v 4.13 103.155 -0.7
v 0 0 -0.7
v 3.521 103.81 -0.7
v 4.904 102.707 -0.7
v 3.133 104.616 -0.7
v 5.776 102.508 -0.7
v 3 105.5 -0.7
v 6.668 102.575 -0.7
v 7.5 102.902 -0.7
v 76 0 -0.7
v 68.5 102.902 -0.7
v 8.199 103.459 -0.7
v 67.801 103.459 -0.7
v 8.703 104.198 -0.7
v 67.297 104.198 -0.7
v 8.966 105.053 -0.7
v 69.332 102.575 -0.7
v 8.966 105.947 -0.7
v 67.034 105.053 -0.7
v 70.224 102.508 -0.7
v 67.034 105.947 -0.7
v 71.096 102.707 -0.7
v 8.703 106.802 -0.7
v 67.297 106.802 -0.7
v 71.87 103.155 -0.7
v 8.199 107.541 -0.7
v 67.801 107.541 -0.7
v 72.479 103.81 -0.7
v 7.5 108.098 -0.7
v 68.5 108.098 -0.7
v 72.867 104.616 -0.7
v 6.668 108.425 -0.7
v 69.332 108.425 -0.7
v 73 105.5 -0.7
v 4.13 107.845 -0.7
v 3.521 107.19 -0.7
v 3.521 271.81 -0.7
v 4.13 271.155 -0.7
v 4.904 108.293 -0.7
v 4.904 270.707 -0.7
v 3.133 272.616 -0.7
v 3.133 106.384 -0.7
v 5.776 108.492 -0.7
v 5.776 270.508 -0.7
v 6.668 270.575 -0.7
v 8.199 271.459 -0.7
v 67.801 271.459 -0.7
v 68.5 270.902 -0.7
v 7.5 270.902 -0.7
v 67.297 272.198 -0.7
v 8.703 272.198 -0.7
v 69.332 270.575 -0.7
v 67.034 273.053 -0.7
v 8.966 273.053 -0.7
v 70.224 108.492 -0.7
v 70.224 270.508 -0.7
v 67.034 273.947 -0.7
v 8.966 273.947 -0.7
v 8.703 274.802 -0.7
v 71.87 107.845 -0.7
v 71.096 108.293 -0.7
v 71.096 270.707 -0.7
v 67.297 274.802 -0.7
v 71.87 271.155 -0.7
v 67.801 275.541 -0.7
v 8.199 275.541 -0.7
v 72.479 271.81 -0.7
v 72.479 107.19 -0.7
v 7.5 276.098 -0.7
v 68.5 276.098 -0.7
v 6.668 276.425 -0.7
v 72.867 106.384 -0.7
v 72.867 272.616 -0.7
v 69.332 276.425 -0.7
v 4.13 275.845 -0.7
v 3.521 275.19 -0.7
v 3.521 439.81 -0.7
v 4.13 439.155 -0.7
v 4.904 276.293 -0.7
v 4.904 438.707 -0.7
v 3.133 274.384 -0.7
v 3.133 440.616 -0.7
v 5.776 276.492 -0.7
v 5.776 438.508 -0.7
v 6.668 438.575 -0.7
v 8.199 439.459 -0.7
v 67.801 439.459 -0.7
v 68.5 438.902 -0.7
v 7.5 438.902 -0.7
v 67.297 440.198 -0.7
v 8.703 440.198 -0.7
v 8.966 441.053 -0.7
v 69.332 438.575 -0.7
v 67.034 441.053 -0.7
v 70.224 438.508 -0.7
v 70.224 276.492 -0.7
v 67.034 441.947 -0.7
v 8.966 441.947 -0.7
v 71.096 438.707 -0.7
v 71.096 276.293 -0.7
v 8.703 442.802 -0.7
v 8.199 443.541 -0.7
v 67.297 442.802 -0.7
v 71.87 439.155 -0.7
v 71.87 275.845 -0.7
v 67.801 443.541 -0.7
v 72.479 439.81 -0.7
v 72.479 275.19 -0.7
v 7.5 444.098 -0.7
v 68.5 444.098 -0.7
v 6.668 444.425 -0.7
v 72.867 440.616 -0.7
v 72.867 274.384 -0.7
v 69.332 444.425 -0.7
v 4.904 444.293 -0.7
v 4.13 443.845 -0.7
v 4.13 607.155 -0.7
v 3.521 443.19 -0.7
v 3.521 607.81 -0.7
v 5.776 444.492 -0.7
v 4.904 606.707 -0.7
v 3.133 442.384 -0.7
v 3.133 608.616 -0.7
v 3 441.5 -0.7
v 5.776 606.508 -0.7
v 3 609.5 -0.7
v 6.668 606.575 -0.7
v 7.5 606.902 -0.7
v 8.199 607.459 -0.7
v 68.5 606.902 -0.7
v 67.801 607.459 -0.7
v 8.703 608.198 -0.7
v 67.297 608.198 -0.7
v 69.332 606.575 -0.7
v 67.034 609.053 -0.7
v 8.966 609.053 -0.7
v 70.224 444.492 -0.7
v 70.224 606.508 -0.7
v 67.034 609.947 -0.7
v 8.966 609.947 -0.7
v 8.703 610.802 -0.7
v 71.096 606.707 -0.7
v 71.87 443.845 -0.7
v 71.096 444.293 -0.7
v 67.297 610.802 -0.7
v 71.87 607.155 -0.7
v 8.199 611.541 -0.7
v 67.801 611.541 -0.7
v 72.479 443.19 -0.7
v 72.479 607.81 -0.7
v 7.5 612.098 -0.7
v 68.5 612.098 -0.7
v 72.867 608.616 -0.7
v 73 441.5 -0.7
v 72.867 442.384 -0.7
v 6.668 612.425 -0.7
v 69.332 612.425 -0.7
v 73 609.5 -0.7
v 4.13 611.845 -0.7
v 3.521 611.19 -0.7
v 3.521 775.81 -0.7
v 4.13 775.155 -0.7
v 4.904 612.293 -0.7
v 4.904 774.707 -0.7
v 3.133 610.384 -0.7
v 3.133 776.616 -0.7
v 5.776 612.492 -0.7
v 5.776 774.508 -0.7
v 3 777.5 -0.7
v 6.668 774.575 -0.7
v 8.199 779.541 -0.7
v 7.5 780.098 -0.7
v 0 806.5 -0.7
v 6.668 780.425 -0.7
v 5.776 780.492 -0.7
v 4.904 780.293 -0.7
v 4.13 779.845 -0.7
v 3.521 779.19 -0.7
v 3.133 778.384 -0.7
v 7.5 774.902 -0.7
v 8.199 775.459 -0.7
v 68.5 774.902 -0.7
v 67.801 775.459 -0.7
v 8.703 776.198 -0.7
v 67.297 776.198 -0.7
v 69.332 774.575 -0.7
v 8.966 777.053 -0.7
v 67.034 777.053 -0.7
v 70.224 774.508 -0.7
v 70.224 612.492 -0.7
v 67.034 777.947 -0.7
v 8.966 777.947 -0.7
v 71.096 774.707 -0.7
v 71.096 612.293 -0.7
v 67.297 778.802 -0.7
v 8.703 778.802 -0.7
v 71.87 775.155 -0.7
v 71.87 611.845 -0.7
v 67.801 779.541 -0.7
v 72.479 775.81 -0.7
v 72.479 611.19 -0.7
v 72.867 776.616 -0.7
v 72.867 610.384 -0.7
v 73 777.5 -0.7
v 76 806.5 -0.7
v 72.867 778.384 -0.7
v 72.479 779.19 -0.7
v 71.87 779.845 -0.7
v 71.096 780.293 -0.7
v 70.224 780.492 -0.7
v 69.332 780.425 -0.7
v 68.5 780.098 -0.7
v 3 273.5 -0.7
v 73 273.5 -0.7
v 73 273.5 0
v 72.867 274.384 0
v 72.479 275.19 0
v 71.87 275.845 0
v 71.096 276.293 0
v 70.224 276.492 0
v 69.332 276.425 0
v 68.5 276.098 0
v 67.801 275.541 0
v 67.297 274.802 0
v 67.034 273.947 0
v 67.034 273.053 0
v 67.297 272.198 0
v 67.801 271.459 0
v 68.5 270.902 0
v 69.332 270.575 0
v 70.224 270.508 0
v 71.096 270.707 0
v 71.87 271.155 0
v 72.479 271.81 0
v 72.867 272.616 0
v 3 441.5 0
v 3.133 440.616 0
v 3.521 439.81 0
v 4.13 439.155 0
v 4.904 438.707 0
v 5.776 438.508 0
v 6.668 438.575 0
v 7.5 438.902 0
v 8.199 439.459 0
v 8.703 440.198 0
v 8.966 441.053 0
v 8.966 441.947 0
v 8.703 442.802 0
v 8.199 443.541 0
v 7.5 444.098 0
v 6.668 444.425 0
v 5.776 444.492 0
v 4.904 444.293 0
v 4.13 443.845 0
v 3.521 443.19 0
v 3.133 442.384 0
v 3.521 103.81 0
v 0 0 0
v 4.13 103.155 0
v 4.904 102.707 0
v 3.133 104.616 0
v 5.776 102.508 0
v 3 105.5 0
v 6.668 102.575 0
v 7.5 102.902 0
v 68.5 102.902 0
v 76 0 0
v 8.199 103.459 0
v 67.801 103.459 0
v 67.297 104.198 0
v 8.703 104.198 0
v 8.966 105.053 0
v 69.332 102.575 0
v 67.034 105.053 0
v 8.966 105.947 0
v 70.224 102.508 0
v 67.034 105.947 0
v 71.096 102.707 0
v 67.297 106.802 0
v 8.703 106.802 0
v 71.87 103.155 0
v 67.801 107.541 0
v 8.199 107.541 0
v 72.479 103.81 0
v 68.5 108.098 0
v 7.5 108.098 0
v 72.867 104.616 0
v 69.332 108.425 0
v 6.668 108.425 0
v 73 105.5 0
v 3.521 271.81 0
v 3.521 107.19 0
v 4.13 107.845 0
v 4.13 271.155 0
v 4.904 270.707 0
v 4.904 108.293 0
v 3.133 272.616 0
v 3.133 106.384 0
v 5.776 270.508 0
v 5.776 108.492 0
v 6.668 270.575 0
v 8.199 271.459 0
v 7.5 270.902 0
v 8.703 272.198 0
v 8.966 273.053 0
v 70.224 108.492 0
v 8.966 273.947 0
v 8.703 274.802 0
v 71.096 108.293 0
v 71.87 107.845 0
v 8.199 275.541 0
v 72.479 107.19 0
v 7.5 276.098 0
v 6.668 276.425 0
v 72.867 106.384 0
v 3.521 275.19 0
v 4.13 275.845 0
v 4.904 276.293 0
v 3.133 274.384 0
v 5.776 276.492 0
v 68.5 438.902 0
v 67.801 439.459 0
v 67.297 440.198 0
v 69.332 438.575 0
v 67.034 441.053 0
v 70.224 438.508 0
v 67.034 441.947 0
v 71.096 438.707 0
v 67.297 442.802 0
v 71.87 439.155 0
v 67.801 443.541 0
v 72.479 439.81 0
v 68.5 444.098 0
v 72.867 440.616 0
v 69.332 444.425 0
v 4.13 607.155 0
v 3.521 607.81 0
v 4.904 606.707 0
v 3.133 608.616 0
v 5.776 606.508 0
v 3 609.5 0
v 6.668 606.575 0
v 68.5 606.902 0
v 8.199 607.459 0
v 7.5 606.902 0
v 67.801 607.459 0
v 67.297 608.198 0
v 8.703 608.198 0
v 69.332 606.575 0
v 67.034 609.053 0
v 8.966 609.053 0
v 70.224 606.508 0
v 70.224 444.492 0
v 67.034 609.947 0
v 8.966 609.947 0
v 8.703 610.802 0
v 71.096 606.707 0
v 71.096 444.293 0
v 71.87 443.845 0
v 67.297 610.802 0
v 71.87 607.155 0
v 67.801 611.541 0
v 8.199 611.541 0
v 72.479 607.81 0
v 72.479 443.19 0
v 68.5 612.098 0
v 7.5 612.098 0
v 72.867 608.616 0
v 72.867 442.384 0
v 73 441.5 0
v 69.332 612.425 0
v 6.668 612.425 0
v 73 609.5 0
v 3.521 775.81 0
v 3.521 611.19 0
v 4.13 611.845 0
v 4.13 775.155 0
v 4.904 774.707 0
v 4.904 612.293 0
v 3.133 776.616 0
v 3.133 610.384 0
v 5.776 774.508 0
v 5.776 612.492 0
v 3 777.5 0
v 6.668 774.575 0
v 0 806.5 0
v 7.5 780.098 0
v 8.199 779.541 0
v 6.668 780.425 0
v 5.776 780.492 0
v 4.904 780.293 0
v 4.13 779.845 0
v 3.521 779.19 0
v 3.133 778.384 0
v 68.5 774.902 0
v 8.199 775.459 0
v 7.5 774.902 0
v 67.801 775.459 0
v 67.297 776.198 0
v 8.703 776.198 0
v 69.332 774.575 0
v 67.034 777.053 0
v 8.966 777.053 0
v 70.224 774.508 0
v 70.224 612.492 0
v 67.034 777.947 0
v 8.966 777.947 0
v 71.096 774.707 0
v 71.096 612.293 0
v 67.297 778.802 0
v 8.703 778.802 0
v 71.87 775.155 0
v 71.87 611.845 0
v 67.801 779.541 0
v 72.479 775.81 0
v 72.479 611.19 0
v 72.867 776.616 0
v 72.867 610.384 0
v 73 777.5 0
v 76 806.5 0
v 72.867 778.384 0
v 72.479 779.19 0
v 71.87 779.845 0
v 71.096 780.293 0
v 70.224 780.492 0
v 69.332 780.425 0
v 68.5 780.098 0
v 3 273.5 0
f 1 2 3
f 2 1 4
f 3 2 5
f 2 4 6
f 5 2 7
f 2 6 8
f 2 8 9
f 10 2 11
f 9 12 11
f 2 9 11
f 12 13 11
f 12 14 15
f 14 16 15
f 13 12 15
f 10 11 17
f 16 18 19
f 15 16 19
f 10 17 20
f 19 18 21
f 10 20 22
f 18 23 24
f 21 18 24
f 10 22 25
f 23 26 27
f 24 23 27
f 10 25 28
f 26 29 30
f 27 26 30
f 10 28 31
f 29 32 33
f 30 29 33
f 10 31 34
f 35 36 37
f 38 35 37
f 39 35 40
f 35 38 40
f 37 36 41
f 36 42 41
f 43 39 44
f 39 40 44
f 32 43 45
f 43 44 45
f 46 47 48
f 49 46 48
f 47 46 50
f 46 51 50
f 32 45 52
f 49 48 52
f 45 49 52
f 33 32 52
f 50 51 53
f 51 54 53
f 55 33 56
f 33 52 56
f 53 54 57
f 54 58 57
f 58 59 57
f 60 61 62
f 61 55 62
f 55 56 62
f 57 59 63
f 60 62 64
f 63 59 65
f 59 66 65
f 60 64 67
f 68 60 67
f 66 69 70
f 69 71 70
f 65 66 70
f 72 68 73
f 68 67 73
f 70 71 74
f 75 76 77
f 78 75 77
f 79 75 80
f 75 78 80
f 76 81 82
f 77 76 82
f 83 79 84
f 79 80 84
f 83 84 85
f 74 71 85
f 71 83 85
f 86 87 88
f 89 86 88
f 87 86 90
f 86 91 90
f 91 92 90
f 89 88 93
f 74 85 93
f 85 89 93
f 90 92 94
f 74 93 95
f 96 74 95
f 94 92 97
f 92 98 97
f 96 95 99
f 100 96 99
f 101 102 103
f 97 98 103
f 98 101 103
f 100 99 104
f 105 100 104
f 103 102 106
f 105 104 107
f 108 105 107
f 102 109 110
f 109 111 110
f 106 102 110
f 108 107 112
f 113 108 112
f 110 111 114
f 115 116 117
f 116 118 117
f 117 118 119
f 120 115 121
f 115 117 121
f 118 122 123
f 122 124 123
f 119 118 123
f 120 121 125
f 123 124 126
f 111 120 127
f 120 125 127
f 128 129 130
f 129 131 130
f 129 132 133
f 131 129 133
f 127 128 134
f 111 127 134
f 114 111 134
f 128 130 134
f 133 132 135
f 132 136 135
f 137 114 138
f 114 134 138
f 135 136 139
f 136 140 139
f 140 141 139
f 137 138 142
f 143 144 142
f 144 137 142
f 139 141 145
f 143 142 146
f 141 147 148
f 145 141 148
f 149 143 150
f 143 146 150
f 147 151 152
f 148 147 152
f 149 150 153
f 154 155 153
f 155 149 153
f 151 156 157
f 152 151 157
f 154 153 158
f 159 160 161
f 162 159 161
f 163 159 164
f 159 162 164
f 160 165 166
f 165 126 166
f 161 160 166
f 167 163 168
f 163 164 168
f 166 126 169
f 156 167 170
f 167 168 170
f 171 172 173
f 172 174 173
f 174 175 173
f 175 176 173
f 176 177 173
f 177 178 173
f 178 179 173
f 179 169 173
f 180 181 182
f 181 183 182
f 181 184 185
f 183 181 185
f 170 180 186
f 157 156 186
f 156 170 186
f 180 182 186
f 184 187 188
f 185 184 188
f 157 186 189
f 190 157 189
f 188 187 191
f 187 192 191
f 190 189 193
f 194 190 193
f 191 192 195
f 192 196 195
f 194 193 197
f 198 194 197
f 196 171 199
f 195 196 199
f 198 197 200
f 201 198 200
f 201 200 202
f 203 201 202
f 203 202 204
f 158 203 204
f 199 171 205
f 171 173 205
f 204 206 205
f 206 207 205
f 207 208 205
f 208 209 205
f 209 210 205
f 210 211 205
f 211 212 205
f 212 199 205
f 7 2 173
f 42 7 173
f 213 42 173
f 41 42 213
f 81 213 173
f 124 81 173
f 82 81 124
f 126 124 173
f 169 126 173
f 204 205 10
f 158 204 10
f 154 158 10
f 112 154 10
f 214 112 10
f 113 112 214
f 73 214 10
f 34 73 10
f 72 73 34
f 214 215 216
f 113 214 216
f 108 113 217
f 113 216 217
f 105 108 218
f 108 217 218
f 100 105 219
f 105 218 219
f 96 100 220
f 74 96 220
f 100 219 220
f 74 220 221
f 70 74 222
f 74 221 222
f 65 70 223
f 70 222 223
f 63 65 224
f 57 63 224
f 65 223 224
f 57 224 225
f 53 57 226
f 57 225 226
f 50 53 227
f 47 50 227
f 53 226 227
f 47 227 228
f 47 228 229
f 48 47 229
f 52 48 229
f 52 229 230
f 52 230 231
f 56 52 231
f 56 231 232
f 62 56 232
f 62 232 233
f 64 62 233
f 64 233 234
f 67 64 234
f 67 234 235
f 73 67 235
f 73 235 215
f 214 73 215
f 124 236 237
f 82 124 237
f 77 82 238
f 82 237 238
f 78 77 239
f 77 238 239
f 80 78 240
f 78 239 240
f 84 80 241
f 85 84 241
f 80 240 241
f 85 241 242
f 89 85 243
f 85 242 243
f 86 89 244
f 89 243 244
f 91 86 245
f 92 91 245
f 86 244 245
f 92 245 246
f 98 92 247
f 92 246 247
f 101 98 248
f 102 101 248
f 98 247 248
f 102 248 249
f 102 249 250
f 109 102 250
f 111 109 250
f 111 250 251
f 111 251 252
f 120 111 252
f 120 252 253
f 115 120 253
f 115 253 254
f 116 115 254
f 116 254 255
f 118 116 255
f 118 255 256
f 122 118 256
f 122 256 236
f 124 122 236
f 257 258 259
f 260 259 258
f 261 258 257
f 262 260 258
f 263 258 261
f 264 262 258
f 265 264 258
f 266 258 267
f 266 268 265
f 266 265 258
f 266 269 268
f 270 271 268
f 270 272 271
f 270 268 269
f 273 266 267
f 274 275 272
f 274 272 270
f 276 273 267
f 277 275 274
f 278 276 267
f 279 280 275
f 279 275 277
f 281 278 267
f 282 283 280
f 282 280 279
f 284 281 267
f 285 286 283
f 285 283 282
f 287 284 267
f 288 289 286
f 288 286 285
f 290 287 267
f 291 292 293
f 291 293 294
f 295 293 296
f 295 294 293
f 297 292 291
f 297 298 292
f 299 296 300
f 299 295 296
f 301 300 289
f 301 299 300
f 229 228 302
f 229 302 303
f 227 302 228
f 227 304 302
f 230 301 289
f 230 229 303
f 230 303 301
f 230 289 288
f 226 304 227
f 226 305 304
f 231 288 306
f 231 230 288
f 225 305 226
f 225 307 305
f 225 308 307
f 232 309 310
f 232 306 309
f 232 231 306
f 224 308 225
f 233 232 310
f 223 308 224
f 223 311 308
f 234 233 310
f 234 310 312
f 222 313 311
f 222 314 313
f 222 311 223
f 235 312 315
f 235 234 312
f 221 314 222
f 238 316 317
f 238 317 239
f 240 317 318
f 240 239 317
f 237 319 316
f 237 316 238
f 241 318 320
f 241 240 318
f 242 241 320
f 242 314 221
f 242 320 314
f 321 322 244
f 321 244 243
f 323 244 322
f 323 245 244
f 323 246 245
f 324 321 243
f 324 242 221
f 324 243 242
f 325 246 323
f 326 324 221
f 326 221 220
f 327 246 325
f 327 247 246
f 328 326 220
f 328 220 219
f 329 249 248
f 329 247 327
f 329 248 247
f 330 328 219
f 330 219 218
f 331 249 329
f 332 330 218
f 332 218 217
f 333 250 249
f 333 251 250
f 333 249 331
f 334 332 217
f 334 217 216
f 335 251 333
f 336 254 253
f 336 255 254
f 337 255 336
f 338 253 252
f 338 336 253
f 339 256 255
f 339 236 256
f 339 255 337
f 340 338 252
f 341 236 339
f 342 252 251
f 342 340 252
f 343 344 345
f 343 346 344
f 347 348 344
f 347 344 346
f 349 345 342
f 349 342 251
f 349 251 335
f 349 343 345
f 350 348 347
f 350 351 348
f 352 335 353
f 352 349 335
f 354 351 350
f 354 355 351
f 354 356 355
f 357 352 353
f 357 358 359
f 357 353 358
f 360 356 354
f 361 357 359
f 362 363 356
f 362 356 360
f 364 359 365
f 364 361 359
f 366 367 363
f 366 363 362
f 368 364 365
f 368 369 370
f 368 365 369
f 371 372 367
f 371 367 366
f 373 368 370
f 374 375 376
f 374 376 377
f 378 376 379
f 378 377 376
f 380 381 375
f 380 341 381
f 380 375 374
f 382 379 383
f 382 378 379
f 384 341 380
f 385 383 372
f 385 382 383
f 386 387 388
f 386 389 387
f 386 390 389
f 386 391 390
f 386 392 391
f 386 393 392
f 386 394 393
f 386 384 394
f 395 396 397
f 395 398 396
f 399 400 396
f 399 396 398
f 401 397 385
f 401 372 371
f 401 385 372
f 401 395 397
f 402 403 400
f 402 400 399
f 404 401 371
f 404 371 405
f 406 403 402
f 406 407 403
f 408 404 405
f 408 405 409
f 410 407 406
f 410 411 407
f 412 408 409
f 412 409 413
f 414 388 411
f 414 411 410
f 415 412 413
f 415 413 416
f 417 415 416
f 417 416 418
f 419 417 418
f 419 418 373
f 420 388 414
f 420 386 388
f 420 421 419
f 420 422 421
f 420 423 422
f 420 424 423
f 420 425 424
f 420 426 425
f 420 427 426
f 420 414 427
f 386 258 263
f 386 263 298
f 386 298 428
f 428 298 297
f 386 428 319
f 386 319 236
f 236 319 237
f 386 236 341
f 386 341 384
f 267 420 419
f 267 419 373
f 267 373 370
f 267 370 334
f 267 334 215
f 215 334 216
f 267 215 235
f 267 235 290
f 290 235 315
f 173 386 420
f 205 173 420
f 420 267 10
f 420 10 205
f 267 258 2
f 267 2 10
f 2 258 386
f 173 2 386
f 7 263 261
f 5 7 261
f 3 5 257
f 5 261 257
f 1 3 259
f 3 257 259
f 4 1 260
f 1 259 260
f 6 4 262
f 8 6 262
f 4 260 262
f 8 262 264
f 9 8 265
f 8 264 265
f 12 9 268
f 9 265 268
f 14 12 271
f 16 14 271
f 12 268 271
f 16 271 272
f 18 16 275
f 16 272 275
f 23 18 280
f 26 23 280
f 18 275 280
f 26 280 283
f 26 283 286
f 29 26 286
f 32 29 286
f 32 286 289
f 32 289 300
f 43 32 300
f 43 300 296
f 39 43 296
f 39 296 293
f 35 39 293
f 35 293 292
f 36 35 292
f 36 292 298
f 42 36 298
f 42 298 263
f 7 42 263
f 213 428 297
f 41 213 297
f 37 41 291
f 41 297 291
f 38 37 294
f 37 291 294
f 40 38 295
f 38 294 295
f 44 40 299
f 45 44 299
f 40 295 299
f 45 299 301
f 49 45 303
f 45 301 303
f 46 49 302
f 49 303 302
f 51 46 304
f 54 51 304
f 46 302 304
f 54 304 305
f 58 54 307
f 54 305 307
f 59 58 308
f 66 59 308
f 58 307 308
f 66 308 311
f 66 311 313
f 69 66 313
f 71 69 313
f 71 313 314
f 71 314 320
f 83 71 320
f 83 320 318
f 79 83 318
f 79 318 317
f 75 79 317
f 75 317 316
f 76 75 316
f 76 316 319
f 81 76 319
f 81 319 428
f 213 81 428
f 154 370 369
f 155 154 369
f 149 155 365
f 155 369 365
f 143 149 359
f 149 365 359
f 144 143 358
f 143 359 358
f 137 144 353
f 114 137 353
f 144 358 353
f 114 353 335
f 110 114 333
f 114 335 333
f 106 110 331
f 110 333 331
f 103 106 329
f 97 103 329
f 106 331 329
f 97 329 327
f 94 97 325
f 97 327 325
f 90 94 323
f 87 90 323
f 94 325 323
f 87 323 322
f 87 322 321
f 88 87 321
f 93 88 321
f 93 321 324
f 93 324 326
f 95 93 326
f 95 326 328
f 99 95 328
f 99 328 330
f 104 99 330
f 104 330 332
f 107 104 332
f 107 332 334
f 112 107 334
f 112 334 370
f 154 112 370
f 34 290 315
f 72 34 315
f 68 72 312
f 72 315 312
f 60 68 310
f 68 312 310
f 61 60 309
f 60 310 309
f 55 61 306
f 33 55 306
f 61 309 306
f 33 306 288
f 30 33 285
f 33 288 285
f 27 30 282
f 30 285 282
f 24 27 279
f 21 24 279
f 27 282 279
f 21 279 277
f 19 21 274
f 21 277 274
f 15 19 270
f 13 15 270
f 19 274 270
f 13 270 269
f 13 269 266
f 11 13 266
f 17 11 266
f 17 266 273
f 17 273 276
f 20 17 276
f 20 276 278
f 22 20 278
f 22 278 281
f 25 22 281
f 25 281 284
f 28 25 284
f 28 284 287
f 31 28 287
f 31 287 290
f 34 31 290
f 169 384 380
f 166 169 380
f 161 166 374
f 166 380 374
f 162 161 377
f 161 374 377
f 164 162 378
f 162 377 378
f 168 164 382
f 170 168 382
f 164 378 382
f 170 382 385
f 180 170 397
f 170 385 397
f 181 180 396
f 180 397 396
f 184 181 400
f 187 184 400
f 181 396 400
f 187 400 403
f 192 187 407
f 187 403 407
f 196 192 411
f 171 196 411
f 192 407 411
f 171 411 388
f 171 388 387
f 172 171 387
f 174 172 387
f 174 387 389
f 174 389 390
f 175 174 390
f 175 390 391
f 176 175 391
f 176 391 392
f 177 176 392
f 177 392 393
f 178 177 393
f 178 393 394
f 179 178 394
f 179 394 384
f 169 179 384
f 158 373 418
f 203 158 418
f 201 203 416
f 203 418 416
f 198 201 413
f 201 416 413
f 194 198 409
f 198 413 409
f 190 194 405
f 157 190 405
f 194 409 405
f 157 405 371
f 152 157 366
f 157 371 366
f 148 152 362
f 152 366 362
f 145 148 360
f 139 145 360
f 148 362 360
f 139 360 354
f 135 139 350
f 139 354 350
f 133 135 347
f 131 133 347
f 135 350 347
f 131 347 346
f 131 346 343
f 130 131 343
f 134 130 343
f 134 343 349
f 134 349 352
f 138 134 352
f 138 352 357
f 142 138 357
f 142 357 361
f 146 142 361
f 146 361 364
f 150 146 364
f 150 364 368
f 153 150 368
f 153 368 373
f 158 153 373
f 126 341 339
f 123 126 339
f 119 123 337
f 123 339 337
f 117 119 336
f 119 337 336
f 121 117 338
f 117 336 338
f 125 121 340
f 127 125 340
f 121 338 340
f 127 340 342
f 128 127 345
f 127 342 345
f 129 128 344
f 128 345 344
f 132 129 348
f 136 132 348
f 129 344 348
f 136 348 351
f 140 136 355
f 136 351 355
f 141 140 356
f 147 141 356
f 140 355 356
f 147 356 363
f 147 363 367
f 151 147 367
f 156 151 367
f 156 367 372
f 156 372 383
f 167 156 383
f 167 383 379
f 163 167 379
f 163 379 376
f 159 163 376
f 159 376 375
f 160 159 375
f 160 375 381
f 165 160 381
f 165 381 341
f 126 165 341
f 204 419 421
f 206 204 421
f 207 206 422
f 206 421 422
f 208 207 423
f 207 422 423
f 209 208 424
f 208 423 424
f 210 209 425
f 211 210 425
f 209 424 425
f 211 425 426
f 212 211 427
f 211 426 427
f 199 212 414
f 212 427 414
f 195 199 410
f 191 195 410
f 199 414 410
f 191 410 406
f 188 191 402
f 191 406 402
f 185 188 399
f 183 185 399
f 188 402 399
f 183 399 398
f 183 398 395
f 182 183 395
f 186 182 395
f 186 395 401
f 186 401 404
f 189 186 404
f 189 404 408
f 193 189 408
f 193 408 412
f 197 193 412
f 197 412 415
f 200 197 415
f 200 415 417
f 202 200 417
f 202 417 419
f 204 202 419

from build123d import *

# Parameters (mm, degrees)
SKETCH1_W          = 76
SKETCH1_H          = 806.5
BASE_FLANGE1_DEPTH = 0.7
SKETCH2_R          = 3
CUT_EXTRUDE1_DEPTH = 10


# Sheet-metal steps are written as plain solids
with BuildPart() as part:
    # Sketch1 → Base-Flange1 (new body)
    with BuildSketch(Plane.XY):
        with Locations((38, 403.25)):
            Rectangle(SKETCH1_W, SKETCH1_H)
    extrude(amount=-BASE_FLANGE1_DEPTH)

    # Sketch2 → Cut-Extrude1 (cut)
    with BuildSketch(Plane.XY):
        with Locations((70, 777.5)):
            Circle(SKETCH2_R)
        with Locations((70, 609.5)):
            Circle(SKETCH2_R)
        with Locations((70, 441.5)):
            Circle(SKETCH2_R)
        with Locations((70, 273.5)):
            Circle(SKETCH2_R)
        with Locations((70, 105.5)):
            Circle(SKETCH2_R)
        with Locations(Location((6, 105.5, 0), (0, 0, 180))):
            Circle(SKETCH2_R)
        with Locations(Location((6, 273.5, 0), (0, 0, 180))):
            Circle(SKETCH2_R)
        with Locations(Location((6, 441.5, 0), (0, 0, 180))):
            Circle(SKETCH2_R)
        with Locations(Location((6, 609.5, 0), (0, 0, 180))):
            Circle(SKETCH2_R)
        with Locations(Location((6, 777.5, 0), (0, 0, 180))):
            Circle(SKETCH2_R)
    extrude(amount=-CUT_EXTRUDE1_DEPTH, mode=Mode.SUBTRACT)


solid = part.part
